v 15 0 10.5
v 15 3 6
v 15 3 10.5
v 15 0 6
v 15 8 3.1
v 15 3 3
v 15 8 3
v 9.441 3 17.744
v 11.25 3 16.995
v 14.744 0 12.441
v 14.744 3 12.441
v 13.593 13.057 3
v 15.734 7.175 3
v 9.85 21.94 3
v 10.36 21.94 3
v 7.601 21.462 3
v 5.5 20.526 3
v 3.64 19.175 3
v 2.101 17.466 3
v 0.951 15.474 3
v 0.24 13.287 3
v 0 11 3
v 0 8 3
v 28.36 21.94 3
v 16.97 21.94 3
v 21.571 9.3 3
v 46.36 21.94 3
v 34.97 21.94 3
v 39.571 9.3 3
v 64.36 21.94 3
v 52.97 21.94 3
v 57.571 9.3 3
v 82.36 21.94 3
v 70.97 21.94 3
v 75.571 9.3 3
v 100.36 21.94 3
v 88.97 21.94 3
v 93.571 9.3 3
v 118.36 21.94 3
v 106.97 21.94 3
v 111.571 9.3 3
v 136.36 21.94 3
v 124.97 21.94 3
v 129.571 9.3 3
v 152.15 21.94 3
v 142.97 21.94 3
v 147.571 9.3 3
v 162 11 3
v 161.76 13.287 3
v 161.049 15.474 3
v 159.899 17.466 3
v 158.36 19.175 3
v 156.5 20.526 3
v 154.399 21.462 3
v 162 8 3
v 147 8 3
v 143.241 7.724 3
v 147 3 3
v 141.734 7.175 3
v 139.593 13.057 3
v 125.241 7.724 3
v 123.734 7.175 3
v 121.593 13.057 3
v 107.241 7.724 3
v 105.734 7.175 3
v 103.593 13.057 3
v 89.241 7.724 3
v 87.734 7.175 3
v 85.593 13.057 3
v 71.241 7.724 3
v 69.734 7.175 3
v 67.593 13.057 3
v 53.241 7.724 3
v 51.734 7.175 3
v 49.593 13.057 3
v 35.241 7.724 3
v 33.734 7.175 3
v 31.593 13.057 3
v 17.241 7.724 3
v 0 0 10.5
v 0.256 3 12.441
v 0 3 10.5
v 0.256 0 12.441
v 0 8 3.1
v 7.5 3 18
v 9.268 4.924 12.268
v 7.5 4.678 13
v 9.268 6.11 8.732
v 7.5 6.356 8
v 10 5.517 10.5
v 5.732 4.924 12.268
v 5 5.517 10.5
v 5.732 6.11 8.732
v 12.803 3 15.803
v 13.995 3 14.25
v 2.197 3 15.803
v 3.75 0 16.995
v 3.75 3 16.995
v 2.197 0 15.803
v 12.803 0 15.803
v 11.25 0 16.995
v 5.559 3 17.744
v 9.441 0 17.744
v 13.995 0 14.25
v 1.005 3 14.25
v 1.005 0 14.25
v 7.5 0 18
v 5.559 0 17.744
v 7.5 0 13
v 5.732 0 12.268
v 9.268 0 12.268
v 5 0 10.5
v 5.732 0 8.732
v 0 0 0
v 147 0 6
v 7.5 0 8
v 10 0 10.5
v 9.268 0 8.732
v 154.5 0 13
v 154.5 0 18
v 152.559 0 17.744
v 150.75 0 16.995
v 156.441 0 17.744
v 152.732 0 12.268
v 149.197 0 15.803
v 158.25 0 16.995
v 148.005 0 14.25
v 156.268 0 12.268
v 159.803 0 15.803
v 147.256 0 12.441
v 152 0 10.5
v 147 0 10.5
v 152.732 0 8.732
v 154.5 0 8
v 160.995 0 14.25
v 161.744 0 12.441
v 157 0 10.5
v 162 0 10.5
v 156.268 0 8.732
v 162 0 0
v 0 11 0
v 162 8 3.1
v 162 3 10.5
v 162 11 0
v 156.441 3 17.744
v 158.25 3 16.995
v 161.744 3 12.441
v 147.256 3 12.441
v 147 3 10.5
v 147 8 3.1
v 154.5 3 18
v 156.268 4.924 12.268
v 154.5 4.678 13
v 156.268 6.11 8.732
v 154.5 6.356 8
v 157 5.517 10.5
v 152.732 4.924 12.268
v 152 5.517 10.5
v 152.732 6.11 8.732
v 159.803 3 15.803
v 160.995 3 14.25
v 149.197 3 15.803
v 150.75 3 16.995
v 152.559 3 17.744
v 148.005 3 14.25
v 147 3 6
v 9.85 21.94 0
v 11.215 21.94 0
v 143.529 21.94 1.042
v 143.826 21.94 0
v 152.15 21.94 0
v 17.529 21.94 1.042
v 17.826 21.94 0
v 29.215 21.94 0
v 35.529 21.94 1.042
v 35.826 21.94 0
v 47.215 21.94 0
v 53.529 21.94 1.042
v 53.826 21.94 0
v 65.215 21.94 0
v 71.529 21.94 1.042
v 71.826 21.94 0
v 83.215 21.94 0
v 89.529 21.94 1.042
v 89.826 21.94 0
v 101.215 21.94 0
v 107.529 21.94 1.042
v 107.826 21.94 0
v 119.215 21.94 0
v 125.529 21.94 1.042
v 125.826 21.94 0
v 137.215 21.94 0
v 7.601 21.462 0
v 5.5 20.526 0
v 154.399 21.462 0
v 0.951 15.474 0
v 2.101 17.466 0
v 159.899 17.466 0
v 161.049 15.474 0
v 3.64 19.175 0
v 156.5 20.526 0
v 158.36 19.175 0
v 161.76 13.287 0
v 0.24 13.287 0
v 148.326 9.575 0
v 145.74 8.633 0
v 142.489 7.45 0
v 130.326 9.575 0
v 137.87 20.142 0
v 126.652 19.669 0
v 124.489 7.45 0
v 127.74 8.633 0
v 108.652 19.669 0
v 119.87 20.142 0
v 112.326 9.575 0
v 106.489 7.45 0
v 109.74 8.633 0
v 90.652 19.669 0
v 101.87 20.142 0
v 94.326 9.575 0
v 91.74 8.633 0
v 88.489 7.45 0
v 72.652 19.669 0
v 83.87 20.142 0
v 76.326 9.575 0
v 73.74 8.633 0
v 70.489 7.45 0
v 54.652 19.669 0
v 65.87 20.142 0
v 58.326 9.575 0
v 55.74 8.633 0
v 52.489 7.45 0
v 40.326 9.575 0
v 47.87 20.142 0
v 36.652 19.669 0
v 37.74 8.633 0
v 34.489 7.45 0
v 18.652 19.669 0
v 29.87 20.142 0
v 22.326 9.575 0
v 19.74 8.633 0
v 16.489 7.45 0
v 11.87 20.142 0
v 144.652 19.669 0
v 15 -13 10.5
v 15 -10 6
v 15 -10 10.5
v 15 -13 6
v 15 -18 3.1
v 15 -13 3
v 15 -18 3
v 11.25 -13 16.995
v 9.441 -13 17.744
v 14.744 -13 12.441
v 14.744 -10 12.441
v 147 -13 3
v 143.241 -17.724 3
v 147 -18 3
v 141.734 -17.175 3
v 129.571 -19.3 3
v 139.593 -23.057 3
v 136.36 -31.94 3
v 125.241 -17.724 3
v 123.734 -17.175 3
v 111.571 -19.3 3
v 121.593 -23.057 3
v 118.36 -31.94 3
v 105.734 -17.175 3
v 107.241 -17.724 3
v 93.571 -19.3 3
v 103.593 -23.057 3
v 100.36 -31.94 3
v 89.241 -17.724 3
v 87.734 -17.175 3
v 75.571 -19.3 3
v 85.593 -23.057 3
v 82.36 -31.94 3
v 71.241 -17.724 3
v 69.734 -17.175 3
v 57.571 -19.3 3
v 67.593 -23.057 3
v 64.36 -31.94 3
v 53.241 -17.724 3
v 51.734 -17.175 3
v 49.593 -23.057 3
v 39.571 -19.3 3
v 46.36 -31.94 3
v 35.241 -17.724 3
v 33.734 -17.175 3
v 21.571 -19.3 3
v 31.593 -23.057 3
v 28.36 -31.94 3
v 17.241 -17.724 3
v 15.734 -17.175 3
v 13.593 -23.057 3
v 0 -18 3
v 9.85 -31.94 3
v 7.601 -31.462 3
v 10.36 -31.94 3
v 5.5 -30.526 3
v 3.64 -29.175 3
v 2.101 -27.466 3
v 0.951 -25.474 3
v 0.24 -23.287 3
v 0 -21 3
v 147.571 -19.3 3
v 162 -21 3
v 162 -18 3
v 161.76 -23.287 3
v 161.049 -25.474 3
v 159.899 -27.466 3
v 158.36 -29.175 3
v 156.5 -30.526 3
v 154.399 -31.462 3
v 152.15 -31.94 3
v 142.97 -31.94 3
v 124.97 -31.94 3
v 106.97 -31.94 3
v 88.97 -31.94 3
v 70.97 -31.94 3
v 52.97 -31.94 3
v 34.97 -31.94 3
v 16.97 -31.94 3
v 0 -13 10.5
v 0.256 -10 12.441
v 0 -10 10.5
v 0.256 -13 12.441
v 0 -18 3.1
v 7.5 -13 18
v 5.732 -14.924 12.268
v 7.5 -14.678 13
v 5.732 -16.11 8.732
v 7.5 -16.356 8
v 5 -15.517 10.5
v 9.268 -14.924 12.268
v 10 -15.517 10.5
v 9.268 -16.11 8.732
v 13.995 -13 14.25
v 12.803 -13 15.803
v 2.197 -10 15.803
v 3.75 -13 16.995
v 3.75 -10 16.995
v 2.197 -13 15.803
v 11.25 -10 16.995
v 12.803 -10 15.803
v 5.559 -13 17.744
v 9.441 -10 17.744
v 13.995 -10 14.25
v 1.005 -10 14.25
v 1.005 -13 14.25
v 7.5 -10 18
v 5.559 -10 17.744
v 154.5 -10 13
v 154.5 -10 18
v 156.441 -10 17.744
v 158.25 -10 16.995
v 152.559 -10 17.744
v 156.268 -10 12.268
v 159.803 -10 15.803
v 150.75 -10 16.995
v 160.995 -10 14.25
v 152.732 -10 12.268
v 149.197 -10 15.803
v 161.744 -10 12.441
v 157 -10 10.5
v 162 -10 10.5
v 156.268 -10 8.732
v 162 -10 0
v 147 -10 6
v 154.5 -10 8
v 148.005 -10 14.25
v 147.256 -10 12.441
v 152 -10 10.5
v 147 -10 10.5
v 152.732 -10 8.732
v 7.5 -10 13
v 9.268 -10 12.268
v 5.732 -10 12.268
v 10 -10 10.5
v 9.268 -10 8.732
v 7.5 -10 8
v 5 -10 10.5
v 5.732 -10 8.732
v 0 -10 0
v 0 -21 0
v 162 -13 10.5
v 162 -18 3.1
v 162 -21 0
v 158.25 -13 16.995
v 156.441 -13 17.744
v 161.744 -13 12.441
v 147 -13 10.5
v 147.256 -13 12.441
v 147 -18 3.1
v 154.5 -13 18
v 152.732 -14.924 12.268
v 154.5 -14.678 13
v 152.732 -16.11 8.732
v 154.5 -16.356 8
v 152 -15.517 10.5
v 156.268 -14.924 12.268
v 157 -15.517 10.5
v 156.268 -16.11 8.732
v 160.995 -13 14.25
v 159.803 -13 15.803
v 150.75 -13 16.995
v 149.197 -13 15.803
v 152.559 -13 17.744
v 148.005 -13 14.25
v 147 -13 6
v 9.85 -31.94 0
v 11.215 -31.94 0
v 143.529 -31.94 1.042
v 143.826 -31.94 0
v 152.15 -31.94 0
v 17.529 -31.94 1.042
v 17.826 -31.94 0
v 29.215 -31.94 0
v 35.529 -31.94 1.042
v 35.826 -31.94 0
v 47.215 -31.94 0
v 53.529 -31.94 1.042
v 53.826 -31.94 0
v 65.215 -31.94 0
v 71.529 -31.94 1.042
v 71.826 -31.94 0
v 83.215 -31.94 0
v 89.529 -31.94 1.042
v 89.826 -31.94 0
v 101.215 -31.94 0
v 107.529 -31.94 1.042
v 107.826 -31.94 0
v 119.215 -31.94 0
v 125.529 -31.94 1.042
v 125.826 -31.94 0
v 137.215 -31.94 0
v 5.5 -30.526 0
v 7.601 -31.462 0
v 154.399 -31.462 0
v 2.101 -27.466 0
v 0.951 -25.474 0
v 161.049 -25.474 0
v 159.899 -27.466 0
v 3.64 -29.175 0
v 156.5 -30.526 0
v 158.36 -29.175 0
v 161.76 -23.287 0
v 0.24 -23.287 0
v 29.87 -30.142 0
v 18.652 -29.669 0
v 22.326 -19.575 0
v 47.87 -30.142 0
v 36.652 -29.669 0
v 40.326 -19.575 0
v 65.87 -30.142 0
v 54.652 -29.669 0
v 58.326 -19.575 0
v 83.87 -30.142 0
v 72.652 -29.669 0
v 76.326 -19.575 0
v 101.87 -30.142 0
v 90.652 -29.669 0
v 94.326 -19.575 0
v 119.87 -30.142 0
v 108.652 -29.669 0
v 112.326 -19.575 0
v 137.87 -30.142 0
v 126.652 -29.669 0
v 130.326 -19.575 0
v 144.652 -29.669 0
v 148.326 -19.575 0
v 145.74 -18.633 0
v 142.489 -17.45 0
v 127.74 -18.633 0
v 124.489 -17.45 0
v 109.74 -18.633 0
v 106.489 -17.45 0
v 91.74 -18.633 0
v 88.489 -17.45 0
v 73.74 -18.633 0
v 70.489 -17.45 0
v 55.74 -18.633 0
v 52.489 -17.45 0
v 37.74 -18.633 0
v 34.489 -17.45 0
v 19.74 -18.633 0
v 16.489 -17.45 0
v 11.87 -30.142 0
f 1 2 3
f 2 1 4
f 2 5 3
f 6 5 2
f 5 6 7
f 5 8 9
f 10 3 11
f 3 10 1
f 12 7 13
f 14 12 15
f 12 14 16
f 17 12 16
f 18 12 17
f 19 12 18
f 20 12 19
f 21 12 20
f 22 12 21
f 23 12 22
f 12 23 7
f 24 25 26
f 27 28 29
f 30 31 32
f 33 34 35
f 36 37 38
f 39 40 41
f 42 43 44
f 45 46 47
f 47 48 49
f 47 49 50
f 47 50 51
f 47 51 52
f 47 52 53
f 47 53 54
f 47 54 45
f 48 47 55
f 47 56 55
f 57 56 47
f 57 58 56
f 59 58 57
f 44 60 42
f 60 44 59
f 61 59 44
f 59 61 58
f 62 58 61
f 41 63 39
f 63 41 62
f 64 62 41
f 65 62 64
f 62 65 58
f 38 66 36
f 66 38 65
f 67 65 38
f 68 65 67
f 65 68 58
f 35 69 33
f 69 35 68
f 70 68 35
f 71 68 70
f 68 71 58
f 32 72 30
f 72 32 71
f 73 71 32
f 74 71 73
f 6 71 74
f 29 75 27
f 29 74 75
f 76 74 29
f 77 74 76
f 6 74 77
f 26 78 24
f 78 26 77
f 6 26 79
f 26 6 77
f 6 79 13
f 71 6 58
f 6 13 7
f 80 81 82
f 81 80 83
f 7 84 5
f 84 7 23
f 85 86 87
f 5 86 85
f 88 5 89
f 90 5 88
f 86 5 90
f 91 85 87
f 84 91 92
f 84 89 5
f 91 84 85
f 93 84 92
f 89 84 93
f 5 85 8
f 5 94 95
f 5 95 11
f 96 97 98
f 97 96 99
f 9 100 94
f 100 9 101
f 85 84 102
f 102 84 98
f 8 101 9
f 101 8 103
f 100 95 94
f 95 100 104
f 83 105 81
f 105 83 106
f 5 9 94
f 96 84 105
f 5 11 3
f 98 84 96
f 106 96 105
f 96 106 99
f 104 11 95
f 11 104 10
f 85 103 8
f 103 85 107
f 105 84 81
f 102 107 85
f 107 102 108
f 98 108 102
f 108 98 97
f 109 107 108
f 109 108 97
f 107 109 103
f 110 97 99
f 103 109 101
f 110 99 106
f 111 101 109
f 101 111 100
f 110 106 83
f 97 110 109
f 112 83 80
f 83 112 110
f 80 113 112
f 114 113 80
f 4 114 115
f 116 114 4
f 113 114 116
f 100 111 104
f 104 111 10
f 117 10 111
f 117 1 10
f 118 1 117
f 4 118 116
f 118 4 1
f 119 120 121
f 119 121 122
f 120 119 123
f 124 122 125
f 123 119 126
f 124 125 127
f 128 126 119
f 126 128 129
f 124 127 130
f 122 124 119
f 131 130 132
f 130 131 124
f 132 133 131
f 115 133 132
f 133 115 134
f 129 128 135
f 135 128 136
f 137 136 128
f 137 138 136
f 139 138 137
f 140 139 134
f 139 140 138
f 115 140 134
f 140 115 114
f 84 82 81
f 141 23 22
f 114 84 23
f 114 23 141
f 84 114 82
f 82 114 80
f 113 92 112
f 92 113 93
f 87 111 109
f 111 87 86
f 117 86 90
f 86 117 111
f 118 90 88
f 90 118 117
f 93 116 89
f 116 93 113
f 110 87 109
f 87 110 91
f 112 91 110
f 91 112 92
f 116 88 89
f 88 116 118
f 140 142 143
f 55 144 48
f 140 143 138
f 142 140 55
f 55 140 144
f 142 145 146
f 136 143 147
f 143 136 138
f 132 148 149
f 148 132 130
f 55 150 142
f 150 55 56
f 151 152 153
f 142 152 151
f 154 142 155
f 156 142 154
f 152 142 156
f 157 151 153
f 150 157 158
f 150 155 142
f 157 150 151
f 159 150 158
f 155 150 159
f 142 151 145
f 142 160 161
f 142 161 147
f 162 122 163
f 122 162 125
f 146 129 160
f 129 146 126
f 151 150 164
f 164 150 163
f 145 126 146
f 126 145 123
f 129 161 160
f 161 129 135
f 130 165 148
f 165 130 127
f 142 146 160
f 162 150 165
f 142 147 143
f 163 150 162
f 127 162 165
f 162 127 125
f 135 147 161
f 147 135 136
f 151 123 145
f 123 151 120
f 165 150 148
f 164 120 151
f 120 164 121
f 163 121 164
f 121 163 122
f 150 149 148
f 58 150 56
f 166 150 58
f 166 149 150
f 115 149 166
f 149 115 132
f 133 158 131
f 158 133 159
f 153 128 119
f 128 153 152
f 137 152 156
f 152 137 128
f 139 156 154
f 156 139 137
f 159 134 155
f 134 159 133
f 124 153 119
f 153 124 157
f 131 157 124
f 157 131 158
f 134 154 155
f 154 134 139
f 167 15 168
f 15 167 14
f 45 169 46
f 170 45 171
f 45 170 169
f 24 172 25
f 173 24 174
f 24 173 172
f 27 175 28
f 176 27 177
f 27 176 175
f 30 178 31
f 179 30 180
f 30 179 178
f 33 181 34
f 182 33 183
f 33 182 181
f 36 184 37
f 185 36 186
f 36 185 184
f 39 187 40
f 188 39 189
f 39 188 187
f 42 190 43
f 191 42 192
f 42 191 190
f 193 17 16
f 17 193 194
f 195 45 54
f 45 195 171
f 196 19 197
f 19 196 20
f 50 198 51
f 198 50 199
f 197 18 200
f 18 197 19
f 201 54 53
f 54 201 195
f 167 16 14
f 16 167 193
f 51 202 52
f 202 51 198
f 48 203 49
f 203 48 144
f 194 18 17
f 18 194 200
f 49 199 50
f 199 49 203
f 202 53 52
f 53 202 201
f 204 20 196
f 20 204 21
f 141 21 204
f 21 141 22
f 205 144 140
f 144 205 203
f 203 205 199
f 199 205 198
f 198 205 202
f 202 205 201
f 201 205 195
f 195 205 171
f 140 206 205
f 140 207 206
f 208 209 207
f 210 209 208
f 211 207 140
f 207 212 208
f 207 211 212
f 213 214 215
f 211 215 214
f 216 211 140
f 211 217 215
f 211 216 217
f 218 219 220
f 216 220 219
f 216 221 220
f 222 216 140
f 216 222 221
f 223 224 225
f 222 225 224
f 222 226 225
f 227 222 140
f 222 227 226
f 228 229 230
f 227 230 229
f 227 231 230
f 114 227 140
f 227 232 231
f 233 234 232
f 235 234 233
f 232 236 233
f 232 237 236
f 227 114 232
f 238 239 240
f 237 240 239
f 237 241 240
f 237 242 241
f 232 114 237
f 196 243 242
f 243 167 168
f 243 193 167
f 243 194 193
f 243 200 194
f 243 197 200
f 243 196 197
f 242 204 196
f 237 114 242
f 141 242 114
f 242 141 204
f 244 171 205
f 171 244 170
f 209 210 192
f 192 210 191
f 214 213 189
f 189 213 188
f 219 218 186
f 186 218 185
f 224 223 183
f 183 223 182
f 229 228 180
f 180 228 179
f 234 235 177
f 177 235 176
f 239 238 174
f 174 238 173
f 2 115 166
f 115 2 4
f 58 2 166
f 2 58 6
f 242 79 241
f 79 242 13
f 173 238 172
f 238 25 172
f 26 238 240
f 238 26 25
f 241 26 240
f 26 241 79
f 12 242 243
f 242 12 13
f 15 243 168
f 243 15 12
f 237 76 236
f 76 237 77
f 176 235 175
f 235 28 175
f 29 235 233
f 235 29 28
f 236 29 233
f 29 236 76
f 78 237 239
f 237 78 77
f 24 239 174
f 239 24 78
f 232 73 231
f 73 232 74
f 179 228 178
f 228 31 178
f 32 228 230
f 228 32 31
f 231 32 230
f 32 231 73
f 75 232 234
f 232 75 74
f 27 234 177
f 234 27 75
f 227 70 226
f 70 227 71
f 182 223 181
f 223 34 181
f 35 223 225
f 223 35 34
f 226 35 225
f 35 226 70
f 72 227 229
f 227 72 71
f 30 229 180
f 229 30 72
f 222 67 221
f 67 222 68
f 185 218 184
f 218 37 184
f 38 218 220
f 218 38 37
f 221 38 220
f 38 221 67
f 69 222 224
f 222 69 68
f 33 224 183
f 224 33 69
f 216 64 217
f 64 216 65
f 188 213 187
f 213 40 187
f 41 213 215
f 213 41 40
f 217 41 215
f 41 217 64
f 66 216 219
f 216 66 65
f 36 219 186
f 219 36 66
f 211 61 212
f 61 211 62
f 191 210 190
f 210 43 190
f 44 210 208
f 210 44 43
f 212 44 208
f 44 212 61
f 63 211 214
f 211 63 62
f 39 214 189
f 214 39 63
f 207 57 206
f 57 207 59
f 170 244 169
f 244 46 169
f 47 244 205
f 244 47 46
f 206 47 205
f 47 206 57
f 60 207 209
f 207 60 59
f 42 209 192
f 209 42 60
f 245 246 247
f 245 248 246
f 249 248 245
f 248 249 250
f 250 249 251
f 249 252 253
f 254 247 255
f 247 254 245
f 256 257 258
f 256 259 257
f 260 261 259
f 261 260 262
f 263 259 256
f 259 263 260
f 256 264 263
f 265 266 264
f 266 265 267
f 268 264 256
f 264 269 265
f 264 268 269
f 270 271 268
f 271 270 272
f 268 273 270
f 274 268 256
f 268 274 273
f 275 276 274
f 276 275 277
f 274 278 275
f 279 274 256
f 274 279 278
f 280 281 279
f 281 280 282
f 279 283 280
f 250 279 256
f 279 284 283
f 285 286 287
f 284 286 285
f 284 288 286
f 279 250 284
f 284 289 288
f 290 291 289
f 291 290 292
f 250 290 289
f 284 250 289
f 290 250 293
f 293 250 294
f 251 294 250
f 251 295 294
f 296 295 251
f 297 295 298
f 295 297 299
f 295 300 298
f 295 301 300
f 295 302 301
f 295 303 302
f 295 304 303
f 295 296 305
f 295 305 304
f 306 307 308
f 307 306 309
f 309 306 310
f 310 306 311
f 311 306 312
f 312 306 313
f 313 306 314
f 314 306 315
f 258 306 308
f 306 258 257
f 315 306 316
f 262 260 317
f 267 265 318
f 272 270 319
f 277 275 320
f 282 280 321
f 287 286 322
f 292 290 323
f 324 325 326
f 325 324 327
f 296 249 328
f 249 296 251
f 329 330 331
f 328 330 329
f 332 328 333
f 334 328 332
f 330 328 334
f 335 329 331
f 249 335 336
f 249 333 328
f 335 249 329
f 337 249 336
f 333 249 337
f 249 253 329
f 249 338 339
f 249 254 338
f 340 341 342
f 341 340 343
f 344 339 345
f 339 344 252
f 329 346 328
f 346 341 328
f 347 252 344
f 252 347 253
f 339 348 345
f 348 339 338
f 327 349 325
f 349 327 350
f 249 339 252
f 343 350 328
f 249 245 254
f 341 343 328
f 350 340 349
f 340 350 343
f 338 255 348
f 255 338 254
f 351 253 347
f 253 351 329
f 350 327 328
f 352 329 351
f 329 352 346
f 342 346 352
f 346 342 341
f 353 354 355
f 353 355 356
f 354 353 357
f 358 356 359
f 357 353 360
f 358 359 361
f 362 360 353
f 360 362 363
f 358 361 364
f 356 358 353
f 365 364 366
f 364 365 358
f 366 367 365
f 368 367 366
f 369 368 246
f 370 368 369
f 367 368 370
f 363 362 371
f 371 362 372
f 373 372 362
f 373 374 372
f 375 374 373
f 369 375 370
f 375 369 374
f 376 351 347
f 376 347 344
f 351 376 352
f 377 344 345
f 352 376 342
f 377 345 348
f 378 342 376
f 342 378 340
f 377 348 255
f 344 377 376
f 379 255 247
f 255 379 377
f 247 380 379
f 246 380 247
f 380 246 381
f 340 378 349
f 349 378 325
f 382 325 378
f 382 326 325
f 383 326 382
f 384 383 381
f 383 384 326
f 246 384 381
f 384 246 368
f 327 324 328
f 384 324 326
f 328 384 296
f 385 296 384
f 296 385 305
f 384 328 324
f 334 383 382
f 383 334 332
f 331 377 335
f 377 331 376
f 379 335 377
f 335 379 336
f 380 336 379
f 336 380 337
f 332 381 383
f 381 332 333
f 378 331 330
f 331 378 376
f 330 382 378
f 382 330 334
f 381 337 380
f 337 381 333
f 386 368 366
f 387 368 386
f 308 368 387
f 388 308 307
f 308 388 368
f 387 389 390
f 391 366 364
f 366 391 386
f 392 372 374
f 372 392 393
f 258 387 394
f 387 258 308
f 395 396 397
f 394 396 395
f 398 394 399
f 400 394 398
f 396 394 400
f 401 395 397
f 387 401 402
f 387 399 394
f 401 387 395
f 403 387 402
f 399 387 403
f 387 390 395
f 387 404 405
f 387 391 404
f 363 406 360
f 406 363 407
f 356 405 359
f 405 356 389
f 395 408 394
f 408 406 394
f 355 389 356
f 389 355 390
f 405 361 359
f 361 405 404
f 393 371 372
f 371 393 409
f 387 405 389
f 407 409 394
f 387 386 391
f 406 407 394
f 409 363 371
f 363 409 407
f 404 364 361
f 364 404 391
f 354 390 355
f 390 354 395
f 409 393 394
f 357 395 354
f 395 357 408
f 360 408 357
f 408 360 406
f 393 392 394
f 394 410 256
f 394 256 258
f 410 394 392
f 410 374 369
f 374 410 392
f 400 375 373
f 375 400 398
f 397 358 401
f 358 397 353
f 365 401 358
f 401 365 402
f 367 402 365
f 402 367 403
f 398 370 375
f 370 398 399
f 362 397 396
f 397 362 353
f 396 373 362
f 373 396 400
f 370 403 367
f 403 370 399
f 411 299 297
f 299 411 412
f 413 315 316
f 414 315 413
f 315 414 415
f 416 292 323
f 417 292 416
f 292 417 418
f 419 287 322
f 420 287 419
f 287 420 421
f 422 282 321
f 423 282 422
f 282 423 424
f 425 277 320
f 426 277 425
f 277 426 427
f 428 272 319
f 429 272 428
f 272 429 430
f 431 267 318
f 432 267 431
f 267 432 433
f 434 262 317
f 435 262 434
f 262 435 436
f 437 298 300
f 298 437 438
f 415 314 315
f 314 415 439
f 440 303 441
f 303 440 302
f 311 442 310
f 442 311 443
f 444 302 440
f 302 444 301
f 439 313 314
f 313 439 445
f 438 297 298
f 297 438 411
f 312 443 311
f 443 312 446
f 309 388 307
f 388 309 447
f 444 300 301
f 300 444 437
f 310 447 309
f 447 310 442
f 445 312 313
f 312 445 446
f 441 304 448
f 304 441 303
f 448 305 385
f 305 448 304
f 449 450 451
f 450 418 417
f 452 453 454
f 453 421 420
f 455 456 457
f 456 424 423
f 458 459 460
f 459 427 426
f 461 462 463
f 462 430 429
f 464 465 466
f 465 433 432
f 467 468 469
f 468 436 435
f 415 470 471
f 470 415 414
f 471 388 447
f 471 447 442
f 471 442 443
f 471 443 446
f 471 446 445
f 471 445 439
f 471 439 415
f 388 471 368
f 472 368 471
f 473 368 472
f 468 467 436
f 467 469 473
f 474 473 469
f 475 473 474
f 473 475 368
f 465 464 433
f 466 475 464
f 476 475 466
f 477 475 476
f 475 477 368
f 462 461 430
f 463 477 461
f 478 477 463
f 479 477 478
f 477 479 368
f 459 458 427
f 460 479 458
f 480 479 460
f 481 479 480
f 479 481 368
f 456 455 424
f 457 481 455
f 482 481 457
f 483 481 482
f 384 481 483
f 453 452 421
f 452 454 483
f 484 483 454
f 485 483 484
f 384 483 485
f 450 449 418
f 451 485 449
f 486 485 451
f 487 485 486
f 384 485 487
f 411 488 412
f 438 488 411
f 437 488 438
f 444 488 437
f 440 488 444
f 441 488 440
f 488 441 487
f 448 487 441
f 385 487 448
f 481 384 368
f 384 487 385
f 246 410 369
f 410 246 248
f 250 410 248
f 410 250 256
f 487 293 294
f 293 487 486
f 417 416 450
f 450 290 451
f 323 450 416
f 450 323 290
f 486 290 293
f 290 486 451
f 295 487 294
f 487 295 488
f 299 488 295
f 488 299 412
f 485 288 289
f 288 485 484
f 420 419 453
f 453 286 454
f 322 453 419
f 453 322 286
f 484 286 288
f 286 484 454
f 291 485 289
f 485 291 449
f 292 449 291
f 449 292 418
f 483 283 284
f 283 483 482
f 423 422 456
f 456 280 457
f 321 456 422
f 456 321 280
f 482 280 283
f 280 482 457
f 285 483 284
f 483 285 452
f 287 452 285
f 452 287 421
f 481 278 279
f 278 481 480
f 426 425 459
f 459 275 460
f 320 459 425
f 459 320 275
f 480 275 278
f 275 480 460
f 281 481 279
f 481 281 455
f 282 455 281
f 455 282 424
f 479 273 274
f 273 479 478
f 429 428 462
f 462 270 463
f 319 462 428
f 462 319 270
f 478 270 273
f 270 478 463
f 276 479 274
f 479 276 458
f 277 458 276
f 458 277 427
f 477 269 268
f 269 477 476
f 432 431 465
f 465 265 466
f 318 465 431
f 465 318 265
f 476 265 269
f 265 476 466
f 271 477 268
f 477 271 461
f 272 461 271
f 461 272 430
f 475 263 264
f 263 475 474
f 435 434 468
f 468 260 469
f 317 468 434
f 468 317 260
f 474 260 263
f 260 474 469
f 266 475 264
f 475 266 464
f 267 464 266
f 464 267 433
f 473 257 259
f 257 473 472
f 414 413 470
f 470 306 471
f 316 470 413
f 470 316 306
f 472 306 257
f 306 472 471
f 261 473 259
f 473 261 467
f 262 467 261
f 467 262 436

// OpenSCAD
part = "all"; // [right, left, all]

// depth of wrench slot
sloth = 14;

// slot width (i.e. max wrench thickness+clearance)
slotw = 6;

// slot angle
slota = 20;

// slot bevel (approx angle of rack)
slotb = 15;

// space between wrench slots
slotsp = 12;

// rack height = slotbase + sloth
slotbase = 8;

// number of wrenches in rack
nwrench = 8;   // [1:30]

// mouting screw hole diameter
screwd = 5;

// thickness of rack
rackt = 3;

rackl = (slotw + slotsp) * (nwrench + 1);
rackh = slotbase + sloth;

module screw_tab() {
   d = screwd * 3;
   rotate([90,0,0]) translate([d/2,d/2+rackt,-rackt])
   difference() {
      hull() {
         cylinder(d=d,h=rackt);
         translate([-d/2,-d/2,rackt-slotbase]) cube([d, 0.1, slotbase]);
      }
      translate([0,0,rackt-slotbase+.1]) cylinder(d=screwd,h=slotbase);
   }
}

module rack() {
   difference() {
      union() {
         hull() {
            translate([rackh/2,rackh/2,0]) cylinder(d=rackh, h=rackt);
            translate([rackl-rackh/2,rackh/2,0])
               cylinder(d=rackh, h=rackt);
            cube([rackl,0.1,rackt]);
         }
         
         // needs a bit of stiffening
         cube([rackl,rackt,rackt*2]);
         
         // screw mounting tabs
         screw_tab();
         translate([rackl-screwd*3,0,0]) screw_tab();
      }
      for(i=[1:nwrench]) {
         x = i*(slotsp+slotw);
         translate([x,slotbase,-rackt*2])
            // note: -slotb as we want the mounting tabs on the inside
            // of each rail...
            rotate([0,-slotb,slota])
               cube([slotw, sloth*2, rackt*4]);
      }
   }
}

if( part == "left" || part == "all" ) {
   rack();
}
if( part == "right" || part == "all" ) {
   translate([0,-10,0]) mirror([0,1,0]) rack();
}
